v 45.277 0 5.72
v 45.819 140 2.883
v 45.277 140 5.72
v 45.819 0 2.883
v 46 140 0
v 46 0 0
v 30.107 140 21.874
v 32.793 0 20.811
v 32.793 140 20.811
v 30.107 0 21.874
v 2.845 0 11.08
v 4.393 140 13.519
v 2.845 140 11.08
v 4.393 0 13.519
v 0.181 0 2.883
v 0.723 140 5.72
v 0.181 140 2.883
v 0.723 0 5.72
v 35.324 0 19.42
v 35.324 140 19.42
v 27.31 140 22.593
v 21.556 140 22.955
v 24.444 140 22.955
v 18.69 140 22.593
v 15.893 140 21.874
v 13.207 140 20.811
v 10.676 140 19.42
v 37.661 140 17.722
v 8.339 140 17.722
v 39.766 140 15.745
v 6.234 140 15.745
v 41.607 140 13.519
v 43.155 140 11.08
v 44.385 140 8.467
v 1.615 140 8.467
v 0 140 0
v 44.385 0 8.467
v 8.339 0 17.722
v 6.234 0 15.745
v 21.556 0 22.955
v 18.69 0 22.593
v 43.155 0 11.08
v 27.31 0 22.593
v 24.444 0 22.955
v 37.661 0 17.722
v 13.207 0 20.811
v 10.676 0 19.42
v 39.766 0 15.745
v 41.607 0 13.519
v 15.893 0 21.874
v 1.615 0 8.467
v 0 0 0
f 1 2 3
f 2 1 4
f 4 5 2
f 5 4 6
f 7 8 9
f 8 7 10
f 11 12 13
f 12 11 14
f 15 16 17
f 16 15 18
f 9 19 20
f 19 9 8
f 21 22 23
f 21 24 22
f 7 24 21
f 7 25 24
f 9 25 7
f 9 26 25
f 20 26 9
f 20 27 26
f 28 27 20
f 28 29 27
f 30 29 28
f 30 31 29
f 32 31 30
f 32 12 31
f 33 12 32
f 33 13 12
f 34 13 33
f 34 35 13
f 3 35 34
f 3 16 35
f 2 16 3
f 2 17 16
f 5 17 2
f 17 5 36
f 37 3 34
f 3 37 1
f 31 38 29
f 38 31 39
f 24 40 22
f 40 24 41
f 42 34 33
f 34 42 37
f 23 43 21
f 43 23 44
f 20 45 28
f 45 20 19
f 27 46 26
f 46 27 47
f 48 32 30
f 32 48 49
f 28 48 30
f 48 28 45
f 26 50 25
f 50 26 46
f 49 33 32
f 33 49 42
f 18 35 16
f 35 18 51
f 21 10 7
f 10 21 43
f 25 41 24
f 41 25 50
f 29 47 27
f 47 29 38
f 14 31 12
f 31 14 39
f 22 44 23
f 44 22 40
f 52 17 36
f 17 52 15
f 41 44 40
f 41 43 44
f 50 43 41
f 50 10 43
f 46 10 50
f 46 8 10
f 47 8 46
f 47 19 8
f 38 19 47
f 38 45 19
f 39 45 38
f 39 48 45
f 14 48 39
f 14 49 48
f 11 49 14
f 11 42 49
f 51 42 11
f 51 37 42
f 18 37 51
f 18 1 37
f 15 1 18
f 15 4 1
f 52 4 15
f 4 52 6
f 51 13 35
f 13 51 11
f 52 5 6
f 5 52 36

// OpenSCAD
// file: _variables.scad
// Length of the lamp shade
LENGTH = 120;
// Outer diameter of the lamp in general
DIAMETER = 50;
// Material strength
RIM = 2;

$fn=50;

// Thickness of the heatsink copper material
HEATSINK_THICKNESS = 1;
// Source file (DXF) of the 2D profile of the heat sink
HEATSINK_SHAPE = "heatsink-shape.dxf";
// Material thickness of the shade
SHADE_THICKNESS = 2;
// CALCULATED: Inner diameter of the lamp shade
INNER_DIAMETER = DIAMETER - 2*SHADE_THICKNESS;

// Thickness (along the axis of the lamp) of the encoder dial
DIAL_THICKNESS = 10;
// Number of teeth on the encoder dial
DIAL_TEETH = 240;
// Depth of each tooth on the encoder dial
DIAL_TEETH_DEPTH = 1;
// CALCULATED: Angle between two neightbouring teeth on the encoder dial
DIAL_TEETH_ANGLE = 360/DIAL_TEETH;

// Source file of the 2D outline of the pcb
PCB_OUTLINE = "./../electronics-design/board-outline.dxf";
// Total thickness of all PCBs with components
PCB_THICKNESS = 10;

// Length (along axis of the lamp) of the "passive" end cap, outside the lamp shade
CAP_OUTER_LENGTH =  5;
// Length (along axis of the lamp) of the "passive" end cap, inside the lamp shade
CAP_INNER_LENGTH = 5;

// Diameter of the hole that the power jack needs in order to protrude through the case
JACK_DRILL_DIAMETER = 5;
// Maximum diameter of that part of the power jack that will be inside the lamp casing
JACK_MAX_DIAMETER = 7;
// Length of that part of the power jack that will be inside the lamp casing
JACK_INNER_LENGTH = 2;
// main file
include <_variables.scad>;


module shade_mold_outer()
{
	wall_thickness = 10;
	width = DIAMETER + 2*wall_thickness;
	length = LENGTH + 2*wall_thickness;
	height = width/2;
	difference() {
		cube([width, length, height]);
		translate([width/2, length, width/2])
		rotate([90, 0, 0])
			cylinder(h=length, d=DIAMETER);
	}
	echo(width = width);
	echo(height = height);
	echo(length = length);
}

module shade_mold_inner()
{
	wall_thickness = 10;
	length = LENGTH + 2*wall_thickness;
	diameter = INNER_DIAMETER;
	difference() {
		translate([diameter/2, length, 0])
		rotate([90, 0, 0])
			cylinder(h=length, d=diameter);
		translate([0, 0, -diameter])
			#cube([diameter, length, diameter]);
	}
}

shade_mold_inner();
// shade_mold_outer();
